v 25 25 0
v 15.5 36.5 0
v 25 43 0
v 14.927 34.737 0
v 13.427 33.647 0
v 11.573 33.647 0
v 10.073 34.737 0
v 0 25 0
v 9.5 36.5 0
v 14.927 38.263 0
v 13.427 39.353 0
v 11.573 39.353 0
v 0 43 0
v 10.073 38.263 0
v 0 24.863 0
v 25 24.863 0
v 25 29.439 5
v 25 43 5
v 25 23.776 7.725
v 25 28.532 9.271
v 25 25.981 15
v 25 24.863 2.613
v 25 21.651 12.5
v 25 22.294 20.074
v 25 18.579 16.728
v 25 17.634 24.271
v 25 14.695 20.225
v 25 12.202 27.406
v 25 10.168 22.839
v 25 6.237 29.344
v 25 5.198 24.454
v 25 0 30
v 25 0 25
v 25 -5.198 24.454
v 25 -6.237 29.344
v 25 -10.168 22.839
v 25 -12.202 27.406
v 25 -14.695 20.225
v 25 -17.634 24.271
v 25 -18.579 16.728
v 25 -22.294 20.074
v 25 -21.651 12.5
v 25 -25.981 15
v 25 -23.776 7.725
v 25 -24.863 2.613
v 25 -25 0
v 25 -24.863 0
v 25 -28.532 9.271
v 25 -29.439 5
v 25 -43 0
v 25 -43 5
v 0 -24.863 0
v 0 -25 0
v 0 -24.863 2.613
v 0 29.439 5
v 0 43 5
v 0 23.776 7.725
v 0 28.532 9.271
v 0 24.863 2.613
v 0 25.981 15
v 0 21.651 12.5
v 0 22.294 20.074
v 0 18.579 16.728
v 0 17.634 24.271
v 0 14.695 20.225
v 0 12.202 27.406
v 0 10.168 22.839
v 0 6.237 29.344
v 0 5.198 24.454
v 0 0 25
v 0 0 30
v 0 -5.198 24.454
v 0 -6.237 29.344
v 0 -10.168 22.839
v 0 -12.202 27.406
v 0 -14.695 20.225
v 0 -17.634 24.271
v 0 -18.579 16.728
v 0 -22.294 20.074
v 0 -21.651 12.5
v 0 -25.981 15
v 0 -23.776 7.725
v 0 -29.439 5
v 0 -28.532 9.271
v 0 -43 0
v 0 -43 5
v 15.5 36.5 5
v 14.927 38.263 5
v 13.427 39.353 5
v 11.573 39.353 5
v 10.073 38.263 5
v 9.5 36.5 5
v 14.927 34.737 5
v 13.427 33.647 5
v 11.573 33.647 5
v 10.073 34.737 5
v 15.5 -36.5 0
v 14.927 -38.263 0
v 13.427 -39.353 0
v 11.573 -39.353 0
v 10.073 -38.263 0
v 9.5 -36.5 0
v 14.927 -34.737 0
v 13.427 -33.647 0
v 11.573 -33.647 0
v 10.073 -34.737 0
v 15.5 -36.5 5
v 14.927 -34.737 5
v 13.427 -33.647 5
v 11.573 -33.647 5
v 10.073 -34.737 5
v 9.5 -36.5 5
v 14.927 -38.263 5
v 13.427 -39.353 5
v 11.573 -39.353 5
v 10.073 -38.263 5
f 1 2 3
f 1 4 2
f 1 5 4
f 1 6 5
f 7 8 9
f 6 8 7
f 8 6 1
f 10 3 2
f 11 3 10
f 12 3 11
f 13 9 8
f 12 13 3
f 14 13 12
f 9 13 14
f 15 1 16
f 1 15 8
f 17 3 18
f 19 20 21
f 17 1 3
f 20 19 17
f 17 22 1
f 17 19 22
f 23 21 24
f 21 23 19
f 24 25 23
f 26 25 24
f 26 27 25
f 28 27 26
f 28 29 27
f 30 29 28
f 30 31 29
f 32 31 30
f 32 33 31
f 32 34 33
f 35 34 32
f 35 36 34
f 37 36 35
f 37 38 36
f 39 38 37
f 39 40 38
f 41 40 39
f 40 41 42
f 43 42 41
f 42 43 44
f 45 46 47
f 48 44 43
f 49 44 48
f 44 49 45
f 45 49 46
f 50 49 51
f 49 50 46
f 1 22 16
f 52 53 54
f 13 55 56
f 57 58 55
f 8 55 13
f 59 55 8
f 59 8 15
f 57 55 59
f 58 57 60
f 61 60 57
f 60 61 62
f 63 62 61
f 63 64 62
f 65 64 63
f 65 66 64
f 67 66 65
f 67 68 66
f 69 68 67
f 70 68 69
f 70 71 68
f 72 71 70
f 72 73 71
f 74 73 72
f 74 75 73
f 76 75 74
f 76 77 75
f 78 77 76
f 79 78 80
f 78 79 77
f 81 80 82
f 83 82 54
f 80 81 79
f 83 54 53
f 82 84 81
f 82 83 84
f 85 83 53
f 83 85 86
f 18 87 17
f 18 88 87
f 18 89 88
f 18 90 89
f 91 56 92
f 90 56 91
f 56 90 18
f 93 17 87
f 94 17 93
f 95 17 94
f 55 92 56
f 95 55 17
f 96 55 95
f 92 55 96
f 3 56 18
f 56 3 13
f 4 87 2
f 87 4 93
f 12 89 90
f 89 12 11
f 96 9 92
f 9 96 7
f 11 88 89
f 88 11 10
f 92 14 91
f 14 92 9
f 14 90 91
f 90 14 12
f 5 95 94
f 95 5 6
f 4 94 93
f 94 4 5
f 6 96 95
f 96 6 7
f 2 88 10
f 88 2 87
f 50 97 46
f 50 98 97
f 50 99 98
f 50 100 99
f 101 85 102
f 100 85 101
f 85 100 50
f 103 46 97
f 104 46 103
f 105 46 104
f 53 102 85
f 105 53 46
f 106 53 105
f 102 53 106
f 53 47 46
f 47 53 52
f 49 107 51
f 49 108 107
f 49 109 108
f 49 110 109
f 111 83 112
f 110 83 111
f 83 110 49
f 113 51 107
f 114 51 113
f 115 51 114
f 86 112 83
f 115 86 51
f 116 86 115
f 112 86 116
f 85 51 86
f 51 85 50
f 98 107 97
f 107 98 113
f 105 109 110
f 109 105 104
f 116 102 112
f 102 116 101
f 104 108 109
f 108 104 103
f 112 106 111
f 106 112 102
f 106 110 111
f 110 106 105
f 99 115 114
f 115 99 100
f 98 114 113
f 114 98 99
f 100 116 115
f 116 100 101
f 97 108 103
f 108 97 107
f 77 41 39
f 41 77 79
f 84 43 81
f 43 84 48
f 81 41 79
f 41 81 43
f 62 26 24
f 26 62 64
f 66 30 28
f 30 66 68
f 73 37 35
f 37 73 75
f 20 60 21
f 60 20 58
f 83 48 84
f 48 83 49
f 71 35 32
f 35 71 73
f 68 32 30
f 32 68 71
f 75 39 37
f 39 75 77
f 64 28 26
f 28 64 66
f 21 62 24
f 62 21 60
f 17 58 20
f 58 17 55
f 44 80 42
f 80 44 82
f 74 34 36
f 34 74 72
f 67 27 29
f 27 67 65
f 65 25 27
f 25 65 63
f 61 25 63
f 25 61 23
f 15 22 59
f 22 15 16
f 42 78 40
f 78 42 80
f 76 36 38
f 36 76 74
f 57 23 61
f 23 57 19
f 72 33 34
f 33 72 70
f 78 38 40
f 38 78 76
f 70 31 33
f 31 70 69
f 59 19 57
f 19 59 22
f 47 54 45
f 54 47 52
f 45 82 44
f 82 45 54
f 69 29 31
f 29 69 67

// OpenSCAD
//customizable something or other
// by PuZZleDucK...




//what to do... no imports doh!

//customizable clamp:
//    Bar diamiter
//    Clamp width
//    bolt size
//    camp length

  //barDiameter is the size of the bar you want to clamp to.
barDiameter = 50;//[2:400]

  //clampWidth is the thicknes of the clamp itself. Thicher clamps will be stronger and heavier.
clampWidth = 5;//[2:50]

  //clampLength is how long the clamp will be. Longer clamps will have greater friction, but require more space.
clampLength = 25;//[2:100]

  //boltSize is the size of the bolt holes on the side tabs. e.g. select 6 if you want to use m6 bolts.
boltSize = 6;//[3,4,6,8,10]


boltRadius = boltSize/2;
tabSize = boltRadius + 10;

//         /--------\
//        / /-------\\
//   ----/ //-------\\\------     x 2
//   --o--//         \\---o--
//   -----/           \------
//




//main components
//   side tabs... width of bolt-size + 10mm either side
//   rounded clamp... inner radius = diam/2, outer = diam/2 + clamp-width


splitWidth = ((barDiameter/2+clampWidth*2+tabSize)*2+10);


//main union
translate([0,0,clampWidth]) rotate([0,90,0]) union() {


//tabs
translate([0,barDiameter/2,0]) difference() {
    cube([clampWidth, tabSize+clampWidth, clampLength]);
    rotate([0,90,0]) translate([-clampLength/2,tabSize/2+clampWidth,0]) cylinder(clampWidth+1,boltRadius,boltRadius);
}//diff-union
translate([0,-(barDiameter/2+tabSize+clampWidth),0]) difference() {
    cube([clampWidth, tabSize+clampWidth, clampLength]);
    rotate([0,90,0]) translate([-clampLength/2,tabSize/2,0]) cylinder(clampWidth+1,boltRadius,boltRadius);
}//diff-union
/* //only one at a time
translate([0,-splitWidth+barDiameter/2,0]) difference() {
    cube([clampWidth, tabSize+clampWidth, clampLength]);
    rotate([0,90,0]) translate([-clampLength/2,tabSize/2+clampWidth,0]) cylinder(clampWidth+1,8,8);
}//diff-union
translate([0,-(barDiameter/2+tabSize+splitWidth+clampWidth),0]) difference() {
    cube([clampWidth, tabSize+clampWidth, clampLength]);
    rotate([0,90,0]) translate([-clampLength/2,tabSize/2,0]) cylinder(clampWidth+1,8,8);
}//diff-union
*/

//clamps
translate([clampWidth,0,0]) hollowTubeHalf(clampLength,barDiameter/2,barDiameter/2,clampWidth);
/* //only one
translate([0,-splitWidth,0]) hollowTubeHalf(clampLength,barDiameter/2,barDiameter/2,clampWidth);

*/

}//main union





//hollow halfs:
module hollowTubeHalf(length, r1, r2, width){
  difference() {
    difference(){
      cylinder(length, r1+width, r2+width);
      cylinder(length+10, r1, r2);
    }//diff
    translate([0,-r1*15,0]) cube([r1*20,r1*30,length]);
  }//diff-union
}
